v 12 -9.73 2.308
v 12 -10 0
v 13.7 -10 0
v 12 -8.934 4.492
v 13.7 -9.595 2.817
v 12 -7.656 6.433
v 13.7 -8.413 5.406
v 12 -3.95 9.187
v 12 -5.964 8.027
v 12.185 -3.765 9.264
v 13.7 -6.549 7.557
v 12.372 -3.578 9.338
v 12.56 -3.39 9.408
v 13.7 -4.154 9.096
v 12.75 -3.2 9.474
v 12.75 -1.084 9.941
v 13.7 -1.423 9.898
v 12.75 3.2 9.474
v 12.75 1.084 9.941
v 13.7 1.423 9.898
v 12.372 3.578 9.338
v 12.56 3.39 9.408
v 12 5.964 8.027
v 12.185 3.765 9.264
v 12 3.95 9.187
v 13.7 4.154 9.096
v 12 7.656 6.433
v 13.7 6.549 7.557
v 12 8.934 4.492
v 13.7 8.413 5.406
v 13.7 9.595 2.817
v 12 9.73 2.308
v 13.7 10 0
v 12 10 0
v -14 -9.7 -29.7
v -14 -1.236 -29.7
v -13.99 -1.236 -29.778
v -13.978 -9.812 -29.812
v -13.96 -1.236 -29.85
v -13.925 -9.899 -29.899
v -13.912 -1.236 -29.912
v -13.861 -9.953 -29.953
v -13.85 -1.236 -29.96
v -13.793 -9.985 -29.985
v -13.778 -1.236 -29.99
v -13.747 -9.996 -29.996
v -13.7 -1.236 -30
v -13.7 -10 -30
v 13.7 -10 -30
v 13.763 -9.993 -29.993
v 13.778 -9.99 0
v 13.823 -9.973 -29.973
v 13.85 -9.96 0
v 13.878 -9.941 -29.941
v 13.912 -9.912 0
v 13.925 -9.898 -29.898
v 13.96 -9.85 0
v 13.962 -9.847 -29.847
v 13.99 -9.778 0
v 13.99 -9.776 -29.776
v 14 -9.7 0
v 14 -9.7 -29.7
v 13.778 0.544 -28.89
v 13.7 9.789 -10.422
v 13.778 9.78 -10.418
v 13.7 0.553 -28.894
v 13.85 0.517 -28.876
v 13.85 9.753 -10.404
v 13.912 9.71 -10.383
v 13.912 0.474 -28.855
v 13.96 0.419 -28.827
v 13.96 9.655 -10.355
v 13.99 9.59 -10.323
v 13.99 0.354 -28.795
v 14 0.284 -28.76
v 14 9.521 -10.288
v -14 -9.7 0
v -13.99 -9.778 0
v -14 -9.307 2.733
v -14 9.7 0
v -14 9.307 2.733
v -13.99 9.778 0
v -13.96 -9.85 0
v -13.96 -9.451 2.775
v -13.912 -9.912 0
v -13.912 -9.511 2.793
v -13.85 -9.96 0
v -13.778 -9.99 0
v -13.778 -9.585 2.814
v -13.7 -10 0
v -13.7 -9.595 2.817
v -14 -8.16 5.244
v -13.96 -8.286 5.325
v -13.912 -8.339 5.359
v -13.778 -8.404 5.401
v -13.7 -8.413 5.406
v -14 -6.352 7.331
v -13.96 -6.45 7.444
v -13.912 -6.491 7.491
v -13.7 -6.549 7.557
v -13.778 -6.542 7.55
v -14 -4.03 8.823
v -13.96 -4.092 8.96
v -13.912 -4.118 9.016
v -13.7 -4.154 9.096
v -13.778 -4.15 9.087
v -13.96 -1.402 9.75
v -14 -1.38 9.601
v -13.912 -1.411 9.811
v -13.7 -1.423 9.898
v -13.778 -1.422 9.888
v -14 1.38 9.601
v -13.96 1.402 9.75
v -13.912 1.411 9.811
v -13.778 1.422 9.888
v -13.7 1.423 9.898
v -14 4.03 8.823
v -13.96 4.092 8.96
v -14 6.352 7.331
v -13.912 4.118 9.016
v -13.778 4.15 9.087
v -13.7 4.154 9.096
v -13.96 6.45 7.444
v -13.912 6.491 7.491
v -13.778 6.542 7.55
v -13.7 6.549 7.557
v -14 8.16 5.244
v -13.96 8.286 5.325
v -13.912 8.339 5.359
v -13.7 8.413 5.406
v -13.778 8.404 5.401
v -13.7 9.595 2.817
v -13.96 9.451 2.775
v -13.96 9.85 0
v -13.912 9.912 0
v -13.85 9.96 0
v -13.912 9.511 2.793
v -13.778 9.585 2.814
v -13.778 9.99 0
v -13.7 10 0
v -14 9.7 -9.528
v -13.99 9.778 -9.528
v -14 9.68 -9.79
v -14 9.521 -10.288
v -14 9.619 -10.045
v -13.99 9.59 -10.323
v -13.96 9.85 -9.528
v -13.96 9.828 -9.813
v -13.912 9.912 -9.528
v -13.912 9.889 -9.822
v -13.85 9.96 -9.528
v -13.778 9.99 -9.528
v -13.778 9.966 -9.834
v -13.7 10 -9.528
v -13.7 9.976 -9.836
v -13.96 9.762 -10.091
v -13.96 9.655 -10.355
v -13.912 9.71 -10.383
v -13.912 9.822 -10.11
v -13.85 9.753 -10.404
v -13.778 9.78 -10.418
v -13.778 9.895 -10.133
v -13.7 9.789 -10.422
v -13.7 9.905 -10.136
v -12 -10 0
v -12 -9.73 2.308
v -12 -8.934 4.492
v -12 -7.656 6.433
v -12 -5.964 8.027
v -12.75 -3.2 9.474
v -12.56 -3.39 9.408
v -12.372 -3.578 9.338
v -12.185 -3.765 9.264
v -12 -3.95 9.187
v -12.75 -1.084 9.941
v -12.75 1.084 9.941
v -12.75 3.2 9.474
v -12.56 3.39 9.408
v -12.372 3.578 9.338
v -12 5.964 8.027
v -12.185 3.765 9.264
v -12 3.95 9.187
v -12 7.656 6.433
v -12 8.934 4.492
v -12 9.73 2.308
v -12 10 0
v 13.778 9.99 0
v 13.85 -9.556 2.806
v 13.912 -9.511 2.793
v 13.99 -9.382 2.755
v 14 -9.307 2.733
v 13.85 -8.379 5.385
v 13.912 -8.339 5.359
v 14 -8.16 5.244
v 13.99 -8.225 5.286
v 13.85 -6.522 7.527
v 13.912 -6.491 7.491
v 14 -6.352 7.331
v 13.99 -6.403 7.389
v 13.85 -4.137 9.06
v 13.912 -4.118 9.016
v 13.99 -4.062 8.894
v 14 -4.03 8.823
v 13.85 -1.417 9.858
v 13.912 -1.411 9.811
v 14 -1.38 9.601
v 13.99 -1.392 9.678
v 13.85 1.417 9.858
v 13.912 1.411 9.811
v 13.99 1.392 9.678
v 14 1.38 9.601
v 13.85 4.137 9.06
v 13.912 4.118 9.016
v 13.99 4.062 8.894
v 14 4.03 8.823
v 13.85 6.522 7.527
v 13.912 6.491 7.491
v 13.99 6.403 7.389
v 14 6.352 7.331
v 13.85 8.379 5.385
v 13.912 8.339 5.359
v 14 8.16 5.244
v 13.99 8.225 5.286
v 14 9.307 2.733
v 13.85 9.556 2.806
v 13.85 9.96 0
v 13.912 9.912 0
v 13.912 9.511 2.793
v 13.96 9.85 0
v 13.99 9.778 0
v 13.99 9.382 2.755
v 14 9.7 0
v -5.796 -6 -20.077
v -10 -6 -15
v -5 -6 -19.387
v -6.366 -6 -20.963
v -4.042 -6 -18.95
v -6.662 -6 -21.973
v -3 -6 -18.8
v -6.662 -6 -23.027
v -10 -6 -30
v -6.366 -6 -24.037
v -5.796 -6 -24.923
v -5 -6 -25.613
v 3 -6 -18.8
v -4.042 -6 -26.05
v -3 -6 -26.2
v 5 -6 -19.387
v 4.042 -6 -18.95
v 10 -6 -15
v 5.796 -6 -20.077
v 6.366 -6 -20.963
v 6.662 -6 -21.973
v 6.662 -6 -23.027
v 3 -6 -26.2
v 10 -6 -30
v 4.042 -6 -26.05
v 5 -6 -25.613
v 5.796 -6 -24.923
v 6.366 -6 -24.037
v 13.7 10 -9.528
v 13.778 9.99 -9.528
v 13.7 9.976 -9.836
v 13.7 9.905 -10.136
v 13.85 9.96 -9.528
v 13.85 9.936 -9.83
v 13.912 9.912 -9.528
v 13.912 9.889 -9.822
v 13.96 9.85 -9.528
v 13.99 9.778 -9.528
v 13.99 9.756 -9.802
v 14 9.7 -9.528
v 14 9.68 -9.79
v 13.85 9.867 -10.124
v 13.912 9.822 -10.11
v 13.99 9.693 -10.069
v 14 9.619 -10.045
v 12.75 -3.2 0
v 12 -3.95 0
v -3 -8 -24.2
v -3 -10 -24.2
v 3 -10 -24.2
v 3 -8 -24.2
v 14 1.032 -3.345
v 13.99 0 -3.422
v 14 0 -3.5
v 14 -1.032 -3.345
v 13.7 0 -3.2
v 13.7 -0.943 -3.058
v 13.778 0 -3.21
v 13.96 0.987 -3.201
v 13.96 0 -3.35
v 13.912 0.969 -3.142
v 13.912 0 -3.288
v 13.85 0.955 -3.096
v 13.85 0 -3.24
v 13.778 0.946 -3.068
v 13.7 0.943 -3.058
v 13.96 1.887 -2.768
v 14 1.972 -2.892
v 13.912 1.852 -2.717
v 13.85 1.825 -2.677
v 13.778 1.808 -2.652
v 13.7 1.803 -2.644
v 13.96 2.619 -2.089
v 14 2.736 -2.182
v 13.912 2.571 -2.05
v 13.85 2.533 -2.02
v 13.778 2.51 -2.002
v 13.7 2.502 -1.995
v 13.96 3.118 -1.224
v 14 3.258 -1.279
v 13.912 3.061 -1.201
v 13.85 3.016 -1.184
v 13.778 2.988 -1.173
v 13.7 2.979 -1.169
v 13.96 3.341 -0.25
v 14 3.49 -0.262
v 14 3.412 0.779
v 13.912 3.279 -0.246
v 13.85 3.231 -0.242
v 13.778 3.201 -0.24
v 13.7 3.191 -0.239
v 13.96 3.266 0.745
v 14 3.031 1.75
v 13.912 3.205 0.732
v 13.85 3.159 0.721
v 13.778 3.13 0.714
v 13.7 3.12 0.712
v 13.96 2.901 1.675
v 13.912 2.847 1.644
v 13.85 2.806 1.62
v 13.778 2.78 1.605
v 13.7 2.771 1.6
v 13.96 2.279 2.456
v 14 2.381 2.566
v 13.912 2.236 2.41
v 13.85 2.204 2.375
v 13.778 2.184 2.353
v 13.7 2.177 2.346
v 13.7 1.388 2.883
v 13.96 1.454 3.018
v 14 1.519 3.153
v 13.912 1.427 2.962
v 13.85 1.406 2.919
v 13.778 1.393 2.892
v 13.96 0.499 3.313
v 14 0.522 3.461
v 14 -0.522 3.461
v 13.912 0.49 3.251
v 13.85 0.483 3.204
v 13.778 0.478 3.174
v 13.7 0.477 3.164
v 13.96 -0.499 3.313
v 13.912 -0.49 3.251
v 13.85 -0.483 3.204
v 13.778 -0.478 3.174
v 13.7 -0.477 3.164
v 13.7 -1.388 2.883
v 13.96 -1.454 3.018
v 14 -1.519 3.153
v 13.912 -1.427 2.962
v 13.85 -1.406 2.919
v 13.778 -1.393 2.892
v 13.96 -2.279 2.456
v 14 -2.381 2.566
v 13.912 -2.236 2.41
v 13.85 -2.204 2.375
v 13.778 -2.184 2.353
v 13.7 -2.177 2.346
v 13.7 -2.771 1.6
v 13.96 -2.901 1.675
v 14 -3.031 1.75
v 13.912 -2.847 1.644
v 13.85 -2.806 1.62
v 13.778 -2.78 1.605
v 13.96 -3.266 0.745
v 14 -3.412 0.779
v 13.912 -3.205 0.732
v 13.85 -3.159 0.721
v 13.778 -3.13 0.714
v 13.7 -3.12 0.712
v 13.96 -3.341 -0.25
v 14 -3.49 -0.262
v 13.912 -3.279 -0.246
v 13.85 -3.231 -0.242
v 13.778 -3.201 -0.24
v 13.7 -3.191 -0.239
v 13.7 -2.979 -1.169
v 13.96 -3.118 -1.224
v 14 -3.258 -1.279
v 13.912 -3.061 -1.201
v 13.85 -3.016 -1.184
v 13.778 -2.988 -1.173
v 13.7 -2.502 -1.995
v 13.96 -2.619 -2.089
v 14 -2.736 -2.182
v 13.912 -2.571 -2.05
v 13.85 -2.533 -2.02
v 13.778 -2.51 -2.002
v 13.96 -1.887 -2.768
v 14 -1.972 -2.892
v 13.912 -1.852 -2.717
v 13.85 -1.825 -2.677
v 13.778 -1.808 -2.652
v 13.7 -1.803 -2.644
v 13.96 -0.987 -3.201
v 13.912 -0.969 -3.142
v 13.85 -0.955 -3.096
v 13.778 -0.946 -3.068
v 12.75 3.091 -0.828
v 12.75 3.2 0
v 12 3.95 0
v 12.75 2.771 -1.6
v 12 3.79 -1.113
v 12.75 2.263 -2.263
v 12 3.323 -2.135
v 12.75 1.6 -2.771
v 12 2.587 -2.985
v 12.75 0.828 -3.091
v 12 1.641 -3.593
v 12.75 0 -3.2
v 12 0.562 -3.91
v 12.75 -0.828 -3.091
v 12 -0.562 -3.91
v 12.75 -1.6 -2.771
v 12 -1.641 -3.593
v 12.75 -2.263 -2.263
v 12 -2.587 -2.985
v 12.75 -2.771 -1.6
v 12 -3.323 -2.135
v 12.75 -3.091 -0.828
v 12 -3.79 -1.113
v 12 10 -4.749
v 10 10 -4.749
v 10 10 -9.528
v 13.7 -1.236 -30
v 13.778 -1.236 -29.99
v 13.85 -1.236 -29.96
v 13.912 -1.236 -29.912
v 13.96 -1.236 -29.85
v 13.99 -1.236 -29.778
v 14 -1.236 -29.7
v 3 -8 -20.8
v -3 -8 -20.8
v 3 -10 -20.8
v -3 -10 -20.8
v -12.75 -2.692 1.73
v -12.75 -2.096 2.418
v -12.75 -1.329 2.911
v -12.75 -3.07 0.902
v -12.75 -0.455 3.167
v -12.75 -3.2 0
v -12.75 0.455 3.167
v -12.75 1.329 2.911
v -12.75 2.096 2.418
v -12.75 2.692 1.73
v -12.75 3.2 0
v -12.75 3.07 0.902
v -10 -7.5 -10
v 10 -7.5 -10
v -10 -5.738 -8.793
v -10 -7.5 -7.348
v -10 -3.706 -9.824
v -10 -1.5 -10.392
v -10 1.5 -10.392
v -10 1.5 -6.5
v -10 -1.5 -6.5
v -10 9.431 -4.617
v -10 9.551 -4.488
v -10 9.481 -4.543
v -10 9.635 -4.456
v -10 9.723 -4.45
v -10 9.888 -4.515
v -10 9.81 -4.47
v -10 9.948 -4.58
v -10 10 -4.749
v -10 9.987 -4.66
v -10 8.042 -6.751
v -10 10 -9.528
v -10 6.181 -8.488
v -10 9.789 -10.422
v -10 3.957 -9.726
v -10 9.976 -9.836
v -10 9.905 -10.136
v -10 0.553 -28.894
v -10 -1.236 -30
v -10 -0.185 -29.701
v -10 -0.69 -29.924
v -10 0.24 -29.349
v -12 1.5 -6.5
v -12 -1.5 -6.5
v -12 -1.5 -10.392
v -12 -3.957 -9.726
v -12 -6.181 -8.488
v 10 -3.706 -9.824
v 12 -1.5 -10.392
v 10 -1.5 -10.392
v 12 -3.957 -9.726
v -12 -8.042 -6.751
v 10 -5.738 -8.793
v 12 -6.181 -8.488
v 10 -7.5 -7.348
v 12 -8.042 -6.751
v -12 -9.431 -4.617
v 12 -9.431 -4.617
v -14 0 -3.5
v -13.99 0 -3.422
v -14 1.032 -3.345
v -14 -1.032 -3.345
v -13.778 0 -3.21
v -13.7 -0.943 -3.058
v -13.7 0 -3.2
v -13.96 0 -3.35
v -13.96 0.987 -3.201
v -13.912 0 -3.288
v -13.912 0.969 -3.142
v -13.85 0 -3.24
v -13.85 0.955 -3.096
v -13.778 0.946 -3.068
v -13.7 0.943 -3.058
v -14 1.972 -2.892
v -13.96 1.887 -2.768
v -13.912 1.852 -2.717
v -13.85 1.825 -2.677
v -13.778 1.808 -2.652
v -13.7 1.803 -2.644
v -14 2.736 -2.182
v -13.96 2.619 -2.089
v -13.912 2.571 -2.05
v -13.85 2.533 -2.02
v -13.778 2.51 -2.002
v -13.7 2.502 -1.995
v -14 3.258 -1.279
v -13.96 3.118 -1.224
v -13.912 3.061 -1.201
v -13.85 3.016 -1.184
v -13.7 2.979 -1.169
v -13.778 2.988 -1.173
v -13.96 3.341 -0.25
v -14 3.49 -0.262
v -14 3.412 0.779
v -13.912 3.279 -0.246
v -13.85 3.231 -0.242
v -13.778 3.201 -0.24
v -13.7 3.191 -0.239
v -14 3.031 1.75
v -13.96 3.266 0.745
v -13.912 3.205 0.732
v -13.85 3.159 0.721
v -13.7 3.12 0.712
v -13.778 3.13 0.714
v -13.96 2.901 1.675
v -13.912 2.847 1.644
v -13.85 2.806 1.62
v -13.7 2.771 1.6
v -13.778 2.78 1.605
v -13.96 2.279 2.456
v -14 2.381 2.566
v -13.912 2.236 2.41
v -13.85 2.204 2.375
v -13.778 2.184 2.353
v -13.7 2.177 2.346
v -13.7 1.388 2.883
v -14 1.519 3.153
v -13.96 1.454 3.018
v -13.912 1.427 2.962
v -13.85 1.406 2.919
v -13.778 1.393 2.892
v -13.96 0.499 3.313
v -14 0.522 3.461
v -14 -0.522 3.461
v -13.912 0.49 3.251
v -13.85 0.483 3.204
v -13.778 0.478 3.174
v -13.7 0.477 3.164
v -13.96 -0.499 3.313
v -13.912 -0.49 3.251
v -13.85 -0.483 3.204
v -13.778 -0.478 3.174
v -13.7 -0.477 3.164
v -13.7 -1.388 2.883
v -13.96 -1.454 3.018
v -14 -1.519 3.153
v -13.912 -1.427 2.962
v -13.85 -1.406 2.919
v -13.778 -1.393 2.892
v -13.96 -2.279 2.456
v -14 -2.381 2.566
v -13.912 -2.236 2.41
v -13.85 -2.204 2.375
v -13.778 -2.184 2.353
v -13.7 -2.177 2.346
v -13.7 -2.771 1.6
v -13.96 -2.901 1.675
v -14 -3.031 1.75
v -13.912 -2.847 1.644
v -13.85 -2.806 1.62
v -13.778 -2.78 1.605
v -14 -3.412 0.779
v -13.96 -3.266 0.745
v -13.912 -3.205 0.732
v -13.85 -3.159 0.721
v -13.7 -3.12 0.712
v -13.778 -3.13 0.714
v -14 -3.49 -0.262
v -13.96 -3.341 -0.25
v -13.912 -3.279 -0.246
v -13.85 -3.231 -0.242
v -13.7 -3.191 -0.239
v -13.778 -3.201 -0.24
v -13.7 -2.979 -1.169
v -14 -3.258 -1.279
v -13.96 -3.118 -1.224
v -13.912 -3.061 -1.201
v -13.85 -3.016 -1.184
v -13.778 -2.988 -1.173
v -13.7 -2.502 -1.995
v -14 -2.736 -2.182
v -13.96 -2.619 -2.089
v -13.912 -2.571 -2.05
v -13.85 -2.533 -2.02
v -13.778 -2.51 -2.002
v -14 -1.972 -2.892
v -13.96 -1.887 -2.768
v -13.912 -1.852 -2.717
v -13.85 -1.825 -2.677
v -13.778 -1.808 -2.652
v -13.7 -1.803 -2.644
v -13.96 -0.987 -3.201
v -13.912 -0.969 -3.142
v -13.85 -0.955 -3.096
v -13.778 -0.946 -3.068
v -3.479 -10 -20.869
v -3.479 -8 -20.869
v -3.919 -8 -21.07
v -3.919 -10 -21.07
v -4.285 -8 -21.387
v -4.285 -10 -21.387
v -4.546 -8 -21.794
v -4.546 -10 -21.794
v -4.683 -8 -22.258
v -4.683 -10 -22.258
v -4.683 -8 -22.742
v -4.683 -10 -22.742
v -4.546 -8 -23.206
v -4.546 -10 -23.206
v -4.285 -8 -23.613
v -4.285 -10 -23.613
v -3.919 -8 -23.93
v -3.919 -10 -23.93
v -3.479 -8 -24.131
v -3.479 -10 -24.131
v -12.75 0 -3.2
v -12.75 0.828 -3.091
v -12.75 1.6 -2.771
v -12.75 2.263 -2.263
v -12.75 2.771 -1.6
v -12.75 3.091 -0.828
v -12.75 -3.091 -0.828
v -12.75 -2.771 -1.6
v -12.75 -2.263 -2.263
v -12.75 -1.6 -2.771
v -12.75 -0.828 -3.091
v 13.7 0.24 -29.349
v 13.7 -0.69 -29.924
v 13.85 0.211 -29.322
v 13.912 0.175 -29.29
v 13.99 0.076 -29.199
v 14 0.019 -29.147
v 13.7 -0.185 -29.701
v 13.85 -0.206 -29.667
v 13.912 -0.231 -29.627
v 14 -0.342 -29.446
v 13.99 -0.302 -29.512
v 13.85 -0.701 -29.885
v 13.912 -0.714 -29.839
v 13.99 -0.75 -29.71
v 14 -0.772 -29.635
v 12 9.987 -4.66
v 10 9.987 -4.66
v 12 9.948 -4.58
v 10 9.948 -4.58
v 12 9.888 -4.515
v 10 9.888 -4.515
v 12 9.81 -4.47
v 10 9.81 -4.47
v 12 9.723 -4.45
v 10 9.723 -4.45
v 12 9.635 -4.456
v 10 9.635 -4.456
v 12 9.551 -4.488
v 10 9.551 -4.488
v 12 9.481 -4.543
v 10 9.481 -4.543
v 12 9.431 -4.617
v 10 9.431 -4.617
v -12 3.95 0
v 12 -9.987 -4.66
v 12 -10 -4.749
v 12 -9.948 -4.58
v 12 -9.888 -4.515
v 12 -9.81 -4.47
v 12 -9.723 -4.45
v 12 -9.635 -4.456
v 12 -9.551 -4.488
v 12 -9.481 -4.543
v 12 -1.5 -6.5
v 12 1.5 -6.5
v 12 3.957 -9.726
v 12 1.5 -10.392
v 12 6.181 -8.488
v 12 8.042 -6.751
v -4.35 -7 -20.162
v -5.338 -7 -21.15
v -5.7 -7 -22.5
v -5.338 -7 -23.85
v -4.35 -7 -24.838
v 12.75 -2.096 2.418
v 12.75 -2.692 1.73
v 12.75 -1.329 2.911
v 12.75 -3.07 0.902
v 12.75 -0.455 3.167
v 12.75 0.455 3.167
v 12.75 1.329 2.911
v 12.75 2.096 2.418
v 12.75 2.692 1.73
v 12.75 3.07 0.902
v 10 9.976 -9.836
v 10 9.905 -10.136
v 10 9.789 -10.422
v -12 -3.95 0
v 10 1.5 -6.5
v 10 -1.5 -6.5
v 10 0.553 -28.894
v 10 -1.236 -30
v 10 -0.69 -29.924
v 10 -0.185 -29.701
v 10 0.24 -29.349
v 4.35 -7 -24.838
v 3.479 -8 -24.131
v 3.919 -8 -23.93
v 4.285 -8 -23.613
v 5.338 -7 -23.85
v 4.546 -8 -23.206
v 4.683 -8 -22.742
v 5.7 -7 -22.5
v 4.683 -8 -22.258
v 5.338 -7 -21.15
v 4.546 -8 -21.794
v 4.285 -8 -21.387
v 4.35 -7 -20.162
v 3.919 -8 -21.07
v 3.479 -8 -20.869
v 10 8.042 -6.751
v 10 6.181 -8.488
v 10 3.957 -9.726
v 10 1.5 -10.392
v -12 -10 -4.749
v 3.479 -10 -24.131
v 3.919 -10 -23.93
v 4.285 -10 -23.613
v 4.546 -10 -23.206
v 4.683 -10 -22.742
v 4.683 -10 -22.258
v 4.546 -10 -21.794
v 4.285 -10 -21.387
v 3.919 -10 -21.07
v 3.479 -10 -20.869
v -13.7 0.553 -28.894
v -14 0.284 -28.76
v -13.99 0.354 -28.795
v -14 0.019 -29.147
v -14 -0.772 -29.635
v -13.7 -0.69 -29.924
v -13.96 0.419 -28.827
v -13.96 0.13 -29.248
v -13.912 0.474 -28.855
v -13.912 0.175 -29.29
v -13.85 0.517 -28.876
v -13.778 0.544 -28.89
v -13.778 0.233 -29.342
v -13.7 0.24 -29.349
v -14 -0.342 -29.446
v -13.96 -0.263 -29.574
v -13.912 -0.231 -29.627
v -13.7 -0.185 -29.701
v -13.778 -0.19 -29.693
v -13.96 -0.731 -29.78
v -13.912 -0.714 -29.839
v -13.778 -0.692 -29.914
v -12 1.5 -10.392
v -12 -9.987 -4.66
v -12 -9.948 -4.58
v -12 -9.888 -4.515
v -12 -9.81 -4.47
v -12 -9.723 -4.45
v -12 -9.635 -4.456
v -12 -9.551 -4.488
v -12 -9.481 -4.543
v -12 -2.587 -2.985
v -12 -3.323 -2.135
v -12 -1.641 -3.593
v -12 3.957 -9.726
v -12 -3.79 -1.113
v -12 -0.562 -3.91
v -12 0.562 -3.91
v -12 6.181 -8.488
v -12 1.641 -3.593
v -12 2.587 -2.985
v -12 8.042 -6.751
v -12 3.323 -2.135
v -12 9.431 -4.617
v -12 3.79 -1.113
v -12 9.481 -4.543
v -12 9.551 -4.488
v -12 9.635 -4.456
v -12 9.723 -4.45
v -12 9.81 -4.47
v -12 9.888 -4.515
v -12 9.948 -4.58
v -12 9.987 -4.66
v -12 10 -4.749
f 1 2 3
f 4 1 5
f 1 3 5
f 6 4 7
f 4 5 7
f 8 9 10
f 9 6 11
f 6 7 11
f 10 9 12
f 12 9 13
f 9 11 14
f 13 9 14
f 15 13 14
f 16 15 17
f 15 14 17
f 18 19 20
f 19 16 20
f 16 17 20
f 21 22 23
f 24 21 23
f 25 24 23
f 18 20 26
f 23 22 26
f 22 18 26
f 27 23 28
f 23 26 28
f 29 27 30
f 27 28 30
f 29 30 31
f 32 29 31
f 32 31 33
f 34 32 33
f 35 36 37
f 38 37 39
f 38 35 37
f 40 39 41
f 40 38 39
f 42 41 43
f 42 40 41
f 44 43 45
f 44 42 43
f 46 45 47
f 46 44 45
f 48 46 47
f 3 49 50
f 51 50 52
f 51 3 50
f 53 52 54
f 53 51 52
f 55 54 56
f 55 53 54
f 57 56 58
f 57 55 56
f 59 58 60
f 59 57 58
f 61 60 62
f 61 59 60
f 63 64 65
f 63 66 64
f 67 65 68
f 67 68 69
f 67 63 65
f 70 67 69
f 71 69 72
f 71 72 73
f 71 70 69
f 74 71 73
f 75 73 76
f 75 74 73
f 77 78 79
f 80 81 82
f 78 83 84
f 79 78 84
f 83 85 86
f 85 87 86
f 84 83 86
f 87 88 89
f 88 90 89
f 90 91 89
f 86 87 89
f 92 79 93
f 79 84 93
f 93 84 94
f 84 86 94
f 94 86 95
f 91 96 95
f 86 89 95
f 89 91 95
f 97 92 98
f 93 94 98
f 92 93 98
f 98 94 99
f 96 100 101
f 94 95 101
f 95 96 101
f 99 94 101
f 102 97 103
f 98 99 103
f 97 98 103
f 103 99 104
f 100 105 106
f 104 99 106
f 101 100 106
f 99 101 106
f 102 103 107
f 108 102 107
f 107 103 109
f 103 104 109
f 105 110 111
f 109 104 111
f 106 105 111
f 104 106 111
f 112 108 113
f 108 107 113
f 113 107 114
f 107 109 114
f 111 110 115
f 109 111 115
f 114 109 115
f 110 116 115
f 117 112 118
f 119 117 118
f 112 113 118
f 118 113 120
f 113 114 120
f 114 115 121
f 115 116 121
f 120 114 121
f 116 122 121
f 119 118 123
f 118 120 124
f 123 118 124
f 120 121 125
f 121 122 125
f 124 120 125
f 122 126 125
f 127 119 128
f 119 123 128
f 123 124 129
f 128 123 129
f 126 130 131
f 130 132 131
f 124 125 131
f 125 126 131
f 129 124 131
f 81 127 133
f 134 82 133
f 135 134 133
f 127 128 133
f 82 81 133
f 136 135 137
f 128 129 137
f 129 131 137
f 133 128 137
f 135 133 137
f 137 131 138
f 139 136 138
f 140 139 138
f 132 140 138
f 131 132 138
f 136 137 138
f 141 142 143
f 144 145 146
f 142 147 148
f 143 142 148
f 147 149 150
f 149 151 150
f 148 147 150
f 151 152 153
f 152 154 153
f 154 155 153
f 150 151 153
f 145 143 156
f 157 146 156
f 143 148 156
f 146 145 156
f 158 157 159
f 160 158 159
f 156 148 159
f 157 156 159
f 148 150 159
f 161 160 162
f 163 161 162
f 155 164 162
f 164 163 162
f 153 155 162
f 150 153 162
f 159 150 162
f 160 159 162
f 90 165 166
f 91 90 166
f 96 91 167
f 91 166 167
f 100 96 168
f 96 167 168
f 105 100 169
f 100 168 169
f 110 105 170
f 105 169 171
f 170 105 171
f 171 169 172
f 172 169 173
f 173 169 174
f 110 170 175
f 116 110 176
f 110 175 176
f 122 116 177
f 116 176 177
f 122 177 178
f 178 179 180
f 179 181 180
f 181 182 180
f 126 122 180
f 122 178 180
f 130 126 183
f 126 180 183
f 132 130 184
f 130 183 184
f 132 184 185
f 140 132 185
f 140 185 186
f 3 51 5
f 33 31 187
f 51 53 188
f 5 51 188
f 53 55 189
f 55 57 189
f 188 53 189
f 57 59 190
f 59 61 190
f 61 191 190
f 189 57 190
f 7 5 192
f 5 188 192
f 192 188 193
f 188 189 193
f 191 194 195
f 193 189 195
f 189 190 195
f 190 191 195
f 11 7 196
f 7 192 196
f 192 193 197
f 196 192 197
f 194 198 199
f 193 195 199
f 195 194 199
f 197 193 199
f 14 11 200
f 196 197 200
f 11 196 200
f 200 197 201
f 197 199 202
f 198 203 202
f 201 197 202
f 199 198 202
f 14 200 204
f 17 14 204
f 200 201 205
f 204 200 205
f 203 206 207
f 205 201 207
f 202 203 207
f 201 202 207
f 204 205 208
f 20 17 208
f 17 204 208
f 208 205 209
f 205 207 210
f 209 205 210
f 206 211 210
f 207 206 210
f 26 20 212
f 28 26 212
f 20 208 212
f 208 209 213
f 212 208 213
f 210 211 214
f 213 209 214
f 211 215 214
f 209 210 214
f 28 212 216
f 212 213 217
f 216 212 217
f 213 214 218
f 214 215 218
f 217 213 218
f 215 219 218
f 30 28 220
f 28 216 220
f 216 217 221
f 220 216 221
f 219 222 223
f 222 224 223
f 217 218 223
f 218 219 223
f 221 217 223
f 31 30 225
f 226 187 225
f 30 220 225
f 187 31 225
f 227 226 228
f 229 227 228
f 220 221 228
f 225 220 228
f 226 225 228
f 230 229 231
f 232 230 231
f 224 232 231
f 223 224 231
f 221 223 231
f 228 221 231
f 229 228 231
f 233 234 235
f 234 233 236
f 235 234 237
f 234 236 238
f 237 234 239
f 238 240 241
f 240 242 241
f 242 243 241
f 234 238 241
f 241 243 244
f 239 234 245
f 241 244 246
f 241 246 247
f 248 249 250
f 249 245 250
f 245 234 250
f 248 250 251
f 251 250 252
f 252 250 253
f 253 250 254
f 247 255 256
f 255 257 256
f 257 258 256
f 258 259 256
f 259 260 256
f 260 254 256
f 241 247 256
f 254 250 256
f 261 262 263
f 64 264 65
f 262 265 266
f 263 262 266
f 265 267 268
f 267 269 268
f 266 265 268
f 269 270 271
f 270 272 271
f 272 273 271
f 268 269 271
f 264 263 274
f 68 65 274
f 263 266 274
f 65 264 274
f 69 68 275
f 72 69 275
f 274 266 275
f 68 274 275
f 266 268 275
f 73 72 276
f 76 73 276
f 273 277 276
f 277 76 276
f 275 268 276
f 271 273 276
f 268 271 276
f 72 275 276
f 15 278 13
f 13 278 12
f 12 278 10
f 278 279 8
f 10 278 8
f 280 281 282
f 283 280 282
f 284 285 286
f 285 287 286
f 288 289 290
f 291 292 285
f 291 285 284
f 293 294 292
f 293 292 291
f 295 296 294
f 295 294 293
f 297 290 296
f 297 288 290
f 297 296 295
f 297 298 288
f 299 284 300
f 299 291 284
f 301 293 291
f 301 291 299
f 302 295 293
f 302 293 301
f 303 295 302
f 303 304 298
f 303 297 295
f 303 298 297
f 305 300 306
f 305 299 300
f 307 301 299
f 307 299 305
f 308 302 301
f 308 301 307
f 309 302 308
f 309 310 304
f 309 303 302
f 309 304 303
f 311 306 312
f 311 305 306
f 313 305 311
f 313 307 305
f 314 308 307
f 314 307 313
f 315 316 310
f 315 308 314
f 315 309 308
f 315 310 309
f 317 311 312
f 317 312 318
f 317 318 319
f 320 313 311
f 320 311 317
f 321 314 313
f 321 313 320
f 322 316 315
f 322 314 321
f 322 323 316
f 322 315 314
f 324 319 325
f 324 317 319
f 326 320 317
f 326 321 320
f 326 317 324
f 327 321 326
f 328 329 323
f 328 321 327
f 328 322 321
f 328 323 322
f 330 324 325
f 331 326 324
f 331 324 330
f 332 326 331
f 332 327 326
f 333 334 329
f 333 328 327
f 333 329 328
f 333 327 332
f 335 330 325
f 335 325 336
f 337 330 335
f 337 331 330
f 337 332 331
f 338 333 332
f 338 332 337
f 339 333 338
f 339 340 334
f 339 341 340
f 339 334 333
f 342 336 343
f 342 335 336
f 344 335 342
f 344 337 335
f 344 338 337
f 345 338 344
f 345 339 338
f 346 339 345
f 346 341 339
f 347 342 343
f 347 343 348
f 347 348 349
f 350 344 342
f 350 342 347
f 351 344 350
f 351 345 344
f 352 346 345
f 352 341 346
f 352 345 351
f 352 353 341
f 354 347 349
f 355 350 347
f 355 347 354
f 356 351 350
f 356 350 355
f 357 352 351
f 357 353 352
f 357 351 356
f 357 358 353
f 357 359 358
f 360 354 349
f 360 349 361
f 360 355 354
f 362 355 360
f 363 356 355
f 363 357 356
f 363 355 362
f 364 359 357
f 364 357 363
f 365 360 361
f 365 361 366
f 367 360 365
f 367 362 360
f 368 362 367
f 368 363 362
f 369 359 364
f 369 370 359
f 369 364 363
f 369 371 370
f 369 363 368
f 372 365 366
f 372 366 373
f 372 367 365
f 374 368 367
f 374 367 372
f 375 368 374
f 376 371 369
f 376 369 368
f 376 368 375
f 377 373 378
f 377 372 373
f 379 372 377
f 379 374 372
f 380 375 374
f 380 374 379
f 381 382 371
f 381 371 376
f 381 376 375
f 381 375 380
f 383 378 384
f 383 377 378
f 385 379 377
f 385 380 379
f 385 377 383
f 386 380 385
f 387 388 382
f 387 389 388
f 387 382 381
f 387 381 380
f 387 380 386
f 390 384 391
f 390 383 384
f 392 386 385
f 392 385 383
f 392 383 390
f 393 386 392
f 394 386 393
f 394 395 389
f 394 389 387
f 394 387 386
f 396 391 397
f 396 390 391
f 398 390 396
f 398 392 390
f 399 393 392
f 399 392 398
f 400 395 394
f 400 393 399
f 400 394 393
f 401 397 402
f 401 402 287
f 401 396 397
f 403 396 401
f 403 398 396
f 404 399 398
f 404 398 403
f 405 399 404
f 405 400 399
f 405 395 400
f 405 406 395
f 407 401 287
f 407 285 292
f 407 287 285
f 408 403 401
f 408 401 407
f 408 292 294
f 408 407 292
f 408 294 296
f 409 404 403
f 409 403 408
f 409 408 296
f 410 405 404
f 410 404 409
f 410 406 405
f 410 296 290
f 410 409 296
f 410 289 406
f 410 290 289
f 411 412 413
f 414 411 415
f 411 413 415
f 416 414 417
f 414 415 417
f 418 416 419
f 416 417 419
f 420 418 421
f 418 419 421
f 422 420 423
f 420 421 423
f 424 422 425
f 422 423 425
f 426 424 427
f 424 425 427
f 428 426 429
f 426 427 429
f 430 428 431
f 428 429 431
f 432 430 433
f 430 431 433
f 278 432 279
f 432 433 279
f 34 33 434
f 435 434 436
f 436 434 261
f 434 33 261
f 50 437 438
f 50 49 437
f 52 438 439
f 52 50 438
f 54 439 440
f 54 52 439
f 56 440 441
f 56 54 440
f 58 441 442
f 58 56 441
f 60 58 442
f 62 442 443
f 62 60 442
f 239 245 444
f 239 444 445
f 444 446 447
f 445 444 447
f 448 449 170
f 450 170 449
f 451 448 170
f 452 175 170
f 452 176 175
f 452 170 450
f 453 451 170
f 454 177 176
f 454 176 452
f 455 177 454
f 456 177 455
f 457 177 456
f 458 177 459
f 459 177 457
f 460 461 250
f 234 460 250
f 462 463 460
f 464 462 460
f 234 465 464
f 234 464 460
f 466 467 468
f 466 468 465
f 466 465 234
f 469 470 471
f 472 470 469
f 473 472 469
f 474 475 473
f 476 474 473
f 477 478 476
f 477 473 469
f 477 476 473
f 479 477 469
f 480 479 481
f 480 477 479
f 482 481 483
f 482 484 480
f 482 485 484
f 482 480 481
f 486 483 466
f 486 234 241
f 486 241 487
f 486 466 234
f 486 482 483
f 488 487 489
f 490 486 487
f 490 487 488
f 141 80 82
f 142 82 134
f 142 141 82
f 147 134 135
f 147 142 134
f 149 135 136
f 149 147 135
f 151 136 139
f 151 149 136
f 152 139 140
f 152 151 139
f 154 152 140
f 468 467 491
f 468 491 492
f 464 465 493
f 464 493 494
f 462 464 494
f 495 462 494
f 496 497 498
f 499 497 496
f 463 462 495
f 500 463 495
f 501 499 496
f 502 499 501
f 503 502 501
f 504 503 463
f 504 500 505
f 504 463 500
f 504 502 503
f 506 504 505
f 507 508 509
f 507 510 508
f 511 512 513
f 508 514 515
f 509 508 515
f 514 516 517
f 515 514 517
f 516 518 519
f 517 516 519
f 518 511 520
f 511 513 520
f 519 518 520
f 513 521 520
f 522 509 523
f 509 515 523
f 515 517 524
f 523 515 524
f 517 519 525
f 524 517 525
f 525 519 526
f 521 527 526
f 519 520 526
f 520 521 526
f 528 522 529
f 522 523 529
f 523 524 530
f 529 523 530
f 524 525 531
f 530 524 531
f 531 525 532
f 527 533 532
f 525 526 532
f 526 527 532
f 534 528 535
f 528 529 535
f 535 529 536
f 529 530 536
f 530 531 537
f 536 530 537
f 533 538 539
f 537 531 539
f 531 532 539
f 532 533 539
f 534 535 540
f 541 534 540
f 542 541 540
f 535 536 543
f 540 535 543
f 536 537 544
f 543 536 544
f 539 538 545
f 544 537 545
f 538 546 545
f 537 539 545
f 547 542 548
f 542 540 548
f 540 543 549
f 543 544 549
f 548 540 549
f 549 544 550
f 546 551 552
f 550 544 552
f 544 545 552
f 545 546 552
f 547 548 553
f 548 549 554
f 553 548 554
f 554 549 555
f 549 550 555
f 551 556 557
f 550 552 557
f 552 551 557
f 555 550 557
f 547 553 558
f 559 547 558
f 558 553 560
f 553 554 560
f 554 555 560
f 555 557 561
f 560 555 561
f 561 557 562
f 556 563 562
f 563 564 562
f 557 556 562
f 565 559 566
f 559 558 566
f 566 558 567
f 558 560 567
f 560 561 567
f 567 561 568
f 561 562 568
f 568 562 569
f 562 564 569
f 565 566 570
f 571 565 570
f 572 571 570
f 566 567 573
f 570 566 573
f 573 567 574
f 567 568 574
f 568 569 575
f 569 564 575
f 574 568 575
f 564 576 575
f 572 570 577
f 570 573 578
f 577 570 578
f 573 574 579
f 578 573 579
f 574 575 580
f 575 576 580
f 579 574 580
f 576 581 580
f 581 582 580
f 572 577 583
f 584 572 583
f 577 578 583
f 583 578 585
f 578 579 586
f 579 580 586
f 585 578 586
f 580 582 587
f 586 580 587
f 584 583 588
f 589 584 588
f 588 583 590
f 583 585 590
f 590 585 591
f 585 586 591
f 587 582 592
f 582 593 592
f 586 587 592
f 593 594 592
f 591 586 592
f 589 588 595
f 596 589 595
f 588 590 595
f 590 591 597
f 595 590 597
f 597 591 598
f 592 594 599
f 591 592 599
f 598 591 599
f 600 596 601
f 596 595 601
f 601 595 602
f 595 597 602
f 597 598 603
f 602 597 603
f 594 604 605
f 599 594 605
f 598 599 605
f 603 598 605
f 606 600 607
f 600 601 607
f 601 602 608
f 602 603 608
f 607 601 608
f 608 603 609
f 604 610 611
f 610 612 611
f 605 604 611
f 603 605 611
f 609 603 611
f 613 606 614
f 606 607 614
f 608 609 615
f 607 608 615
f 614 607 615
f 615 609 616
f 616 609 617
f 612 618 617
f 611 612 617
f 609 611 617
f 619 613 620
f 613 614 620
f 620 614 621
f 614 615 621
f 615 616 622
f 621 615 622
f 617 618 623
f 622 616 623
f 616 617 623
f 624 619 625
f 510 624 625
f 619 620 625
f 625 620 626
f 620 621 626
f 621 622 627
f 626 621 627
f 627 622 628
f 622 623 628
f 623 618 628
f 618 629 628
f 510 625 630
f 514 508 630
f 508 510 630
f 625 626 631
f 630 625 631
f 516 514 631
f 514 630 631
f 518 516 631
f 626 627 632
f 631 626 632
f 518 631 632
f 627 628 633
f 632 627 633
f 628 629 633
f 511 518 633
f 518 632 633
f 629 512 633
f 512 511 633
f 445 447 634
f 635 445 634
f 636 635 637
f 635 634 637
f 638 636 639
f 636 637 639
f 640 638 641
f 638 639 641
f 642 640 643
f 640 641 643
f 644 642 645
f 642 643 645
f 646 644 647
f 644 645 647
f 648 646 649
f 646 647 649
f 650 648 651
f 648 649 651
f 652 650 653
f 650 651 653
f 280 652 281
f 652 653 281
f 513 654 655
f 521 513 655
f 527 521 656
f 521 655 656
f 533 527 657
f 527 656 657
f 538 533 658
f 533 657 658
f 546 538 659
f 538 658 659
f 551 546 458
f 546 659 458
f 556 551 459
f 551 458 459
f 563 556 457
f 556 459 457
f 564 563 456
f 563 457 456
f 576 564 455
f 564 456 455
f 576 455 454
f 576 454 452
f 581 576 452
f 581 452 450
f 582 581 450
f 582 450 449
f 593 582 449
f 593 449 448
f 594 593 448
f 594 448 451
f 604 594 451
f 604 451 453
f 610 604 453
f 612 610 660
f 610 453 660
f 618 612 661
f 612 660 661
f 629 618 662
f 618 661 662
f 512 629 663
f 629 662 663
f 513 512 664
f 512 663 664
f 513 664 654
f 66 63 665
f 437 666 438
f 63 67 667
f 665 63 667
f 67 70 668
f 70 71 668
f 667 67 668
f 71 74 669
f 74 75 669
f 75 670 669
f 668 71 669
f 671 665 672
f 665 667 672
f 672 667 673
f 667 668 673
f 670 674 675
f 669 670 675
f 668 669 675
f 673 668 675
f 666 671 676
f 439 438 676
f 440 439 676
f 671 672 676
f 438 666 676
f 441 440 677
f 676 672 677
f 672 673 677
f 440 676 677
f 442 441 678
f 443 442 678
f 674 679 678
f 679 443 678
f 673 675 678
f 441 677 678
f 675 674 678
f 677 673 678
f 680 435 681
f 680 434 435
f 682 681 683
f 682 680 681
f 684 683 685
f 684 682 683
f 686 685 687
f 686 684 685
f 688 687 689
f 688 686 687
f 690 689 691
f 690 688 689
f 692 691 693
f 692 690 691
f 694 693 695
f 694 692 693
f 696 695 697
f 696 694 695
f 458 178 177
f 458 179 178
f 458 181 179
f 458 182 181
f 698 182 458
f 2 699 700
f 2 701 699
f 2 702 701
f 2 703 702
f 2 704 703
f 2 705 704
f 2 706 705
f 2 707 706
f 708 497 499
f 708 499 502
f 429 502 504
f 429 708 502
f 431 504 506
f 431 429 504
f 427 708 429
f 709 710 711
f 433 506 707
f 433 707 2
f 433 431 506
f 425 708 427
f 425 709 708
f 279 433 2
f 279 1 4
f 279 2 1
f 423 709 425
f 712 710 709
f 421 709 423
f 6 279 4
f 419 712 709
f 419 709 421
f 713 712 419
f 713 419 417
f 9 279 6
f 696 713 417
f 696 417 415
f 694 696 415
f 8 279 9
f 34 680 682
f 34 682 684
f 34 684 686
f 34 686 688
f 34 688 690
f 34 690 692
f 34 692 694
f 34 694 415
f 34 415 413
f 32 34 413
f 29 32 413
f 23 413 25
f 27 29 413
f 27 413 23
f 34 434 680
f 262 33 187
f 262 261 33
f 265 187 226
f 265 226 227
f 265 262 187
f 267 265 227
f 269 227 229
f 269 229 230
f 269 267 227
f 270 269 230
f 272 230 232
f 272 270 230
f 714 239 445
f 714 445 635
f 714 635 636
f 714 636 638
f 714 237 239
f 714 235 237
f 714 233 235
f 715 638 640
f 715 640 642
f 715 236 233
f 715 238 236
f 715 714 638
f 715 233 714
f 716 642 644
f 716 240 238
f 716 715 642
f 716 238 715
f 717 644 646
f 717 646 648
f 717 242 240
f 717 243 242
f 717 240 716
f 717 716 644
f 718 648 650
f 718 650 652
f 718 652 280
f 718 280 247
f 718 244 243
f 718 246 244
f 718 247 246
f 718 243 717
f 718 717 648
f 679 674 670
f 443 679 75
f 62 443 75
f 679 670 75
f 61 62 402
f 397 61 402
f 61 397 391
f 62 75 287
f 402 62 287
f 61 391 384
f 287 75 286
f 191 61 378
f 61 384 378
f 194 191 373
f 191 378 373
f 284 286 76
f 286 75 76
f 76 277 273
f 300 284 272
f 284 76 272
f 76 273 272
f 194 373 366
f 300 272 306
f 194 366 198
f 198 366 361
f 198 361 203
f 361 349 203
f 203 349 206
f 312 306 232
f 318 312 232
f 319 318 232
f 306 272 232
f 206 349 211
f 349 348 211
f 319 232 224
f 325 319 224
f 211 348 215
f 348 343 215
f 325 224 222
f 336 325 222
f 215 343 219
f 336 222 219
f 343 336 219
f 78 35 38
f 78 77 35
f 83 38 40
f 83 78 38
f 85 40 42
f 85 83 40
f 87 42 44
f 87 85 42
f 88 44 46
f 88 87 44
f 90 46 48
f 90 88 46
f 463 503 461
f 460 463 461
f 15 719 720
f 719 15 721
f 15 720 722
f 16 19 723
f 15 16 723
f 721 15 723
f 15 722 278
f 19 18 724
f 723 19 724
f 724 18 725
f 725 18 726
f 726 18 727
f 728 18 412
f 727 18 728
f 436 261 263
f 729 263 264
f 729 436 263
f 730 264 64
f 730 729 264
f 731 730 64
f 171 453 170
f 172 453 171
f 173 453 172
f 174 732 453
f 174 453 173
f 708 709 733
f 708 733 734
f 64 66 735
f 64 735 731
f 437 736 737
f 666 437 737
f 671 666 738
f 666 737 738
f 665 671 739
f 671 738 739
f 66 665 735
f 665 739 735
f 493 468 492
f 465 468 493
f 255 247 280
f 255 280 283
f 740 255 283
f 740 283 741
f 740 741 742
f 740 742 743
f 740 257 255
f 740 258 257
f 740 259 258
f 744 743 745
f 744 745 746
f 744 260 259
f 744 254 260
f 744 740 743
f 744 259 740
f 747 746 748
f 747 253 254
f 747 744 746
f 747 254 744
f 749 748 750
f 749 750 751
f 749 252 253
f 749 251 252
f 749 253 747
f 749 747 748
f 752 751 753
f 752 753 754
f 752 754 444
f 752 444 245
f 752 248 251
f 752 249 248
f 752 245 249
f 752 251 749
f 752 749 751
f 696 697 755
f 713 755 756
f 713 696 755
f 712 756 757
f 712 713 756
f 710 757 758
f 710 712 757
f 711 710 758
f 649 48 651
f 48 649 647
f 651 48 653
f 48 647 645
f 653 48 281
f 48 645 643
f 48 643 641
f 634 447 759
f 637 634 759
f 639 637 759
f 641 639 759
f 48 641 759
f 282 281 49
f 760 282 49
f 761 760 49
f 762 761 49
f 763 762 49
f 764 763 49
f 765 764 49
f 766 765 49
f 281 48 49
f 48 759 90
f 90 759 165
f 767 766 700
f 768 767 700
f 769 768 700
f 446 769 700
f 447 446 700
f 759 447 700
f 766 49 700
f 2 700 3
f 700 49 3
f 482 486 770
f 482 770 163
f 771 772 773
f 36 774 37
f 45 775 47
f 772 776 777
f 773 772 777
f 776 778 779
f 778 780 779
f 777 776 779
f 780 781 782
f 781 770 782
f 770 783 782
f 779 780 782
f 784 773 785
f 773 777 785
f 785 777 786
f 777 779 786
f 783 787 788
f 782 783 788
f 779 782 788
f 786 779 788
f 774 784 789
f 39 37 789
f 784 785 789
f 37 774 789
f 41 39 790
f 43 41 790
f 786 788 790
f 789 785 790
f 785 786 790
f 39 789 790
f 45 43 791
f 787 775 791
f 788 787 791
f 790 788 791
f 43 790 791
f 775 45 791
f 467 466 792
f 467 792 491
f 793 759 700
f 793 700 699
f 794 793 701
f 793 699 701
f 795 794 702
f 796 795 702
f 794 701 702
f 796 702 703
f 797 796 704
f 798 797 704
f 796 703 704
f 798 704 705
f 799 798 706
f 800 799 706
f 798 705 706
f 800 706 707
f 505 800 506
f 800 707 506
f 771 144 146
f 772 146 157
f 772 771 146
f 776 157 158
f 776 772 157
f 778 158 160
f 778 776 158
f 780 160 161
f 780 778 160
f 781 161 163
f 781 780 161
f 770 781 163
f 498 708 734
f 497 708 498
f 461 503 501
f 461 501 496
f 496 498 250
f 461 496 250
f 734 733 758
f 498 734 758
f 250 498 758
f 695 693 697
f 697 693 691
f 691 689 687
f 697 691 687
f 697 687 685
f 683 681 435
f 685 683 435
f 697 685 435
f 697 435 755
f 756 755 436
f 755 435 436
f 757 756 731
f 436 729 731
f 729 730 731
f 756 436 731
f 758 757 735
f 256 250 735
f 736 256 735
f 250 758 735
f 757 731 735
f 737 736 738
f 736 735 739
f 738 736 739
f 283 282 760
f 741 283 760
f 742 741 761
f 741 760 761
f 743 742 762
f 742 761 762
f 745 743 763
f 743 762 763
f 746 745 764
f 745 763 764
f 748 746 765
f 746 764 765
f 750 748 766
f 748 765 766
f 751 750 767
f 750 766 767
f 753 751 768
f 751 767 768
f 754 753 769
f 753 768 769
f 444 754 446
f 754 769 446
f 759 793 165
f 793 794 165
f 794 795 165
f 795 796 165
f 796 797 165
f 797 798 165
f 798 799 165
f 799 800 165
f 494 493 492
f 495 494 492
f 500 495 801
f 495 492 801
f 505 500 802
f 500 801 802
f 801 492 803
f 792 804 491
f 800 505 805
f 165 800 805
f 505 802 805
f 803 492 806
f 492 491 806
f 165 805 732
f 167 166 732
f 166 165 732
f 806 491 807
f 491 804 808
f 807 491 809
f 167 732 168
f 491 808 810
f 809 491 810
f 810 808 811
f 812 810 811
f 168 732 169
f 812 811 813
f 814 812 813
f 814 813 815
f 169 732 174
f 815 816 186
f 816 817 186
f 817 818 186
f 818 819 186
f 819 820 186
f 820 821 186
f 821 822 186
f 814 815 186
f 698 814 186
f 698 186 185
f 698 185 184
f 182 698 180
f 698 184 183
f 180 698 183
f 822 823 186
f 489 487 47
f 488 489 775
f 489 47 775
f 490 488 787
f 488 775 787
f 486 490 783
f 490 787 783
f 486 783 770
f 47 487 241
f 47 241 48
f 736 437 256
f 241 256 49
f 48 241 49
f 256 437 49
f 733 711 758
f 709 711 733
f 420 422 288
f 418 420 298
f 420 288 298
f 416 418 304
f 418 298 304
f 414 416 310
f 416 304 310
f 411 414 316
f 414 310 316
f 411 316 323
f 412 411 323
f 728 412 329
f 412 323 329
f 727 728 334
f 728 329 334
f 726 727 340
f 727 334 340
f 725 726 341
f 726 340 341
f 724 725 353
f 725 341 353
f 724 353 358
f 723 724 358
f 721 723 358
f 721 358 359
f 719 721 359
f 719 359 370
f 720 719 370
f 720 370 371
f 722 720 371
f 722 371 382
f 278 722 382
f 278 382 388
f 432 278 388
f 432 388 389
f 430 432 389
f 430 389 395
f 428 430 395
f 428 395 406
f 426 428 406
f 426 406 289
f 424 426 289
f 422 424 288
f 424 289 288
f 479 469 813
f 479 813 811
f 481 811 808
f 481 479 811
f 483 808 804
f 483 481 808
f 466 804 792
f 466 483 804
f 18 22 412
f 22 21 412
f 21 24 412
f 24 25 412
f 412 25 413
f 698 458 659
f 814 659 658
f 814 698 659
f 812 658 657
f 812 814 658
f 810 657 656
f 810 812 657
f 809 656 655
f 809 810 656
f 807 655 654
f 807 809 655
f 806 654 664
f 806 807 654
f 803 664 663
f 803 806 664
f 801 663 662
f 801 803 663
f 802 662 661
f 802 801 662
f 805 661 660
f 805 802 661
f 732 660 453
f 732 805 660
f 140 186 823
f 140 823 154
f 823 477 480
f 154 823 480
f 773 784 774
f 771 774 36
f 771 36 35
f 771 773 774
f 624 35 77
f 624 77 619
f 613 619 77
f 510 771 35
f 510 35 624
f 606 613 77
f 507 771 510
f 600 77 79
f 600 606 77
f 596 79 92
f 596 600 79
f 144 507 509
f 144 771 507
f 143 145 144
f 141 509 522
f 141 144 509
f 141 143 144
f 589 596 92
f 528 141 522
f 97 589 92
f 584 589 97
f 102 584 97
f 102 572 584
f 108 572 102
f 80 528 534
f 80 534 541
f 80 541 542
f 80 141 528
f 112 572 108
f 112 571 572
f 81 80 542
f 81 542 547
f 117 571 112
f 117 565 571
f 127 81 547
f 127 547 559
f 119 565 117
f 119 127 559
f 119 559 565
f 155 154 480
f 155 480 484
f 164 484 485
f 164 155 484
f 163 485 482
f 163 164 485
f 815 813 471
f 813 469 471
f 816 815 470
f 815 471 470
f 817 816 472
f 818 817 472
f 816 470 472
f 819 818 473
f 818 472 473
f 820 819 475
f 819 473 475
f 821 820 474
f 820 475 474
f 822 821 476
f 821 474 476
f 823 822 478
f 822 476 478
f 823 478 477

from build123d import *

# Parameters (mm, degrees)
BOSS_EXTRUDE1_DEPTH = 14
SKETCH2_R           = 3.2
CUT_EXTRUDE1_DEPTH  = 48
CUT_EXTRUDE2_DEPTH  = 10
CUT_EXTRUDE4_DEPTH  = 12
FILLET1_R           = 0.3
CUT_EXTRUDE3_DEPTH  = 4
CHAMFER1_SIZE       = 2
FILLET2_R           = 2
FILLET3_R           = 0.3
SKETCH7_W           = 25.5
SKETCH7_H           = 10
CUT_EXTRUDE5_DEPTH  = 3.2
CHAMFER2_SIZE       = 0.75


with BuildPart() as part:
    # Sketch1 → Boss-Extrude1 (new, symmetric)
    with BuildSketch(Plane(origin=(0, 0, 0), x_dir=(0, 0, -1), z_dir=(1, 0, 0))):
        with BuildLine():
            Line((30, -10), (0, -10))
            ThreePointArc((0, -10), (-10, 0), (0, 10))
            Line((0, 10), (30, 10))
            Line((30, 10), (30, -10))
        make_face()
    extrude(amount=BOSS_EXTRUDE1_DEPTH, both=True)

    # Sketch2 → Cut-Extrude1 (cut)
    with BuildSketch(Plane(origin=(14, 0, 0), x_dir=(0, 0, -1), z_dir=(1, 0, 0))):
        Circle(SKETCH2_R)
        Polygon((30, 0), (10, 10), (30, 10), align=None)
    extrude(amount=-CUT_EXTRUDE1_DEPTH, mode=Mode.SUBTRACT)

    # Sketch4 → Cut-Extrude2 (cut, symmetric)
    with BuildSketch(Plane(origin=(0, 0, 0), x_dir=(0, 0, -1), z_dir=(1, 0, 0))):
        with BuildLine():
            Line((0, -10), (1.5, -10))
            Line((1.5, -10), (1.5, -7.5))
            Line((1.5, -7.5), (10, -7.5))
            Line((10, -7.5), (15, -6))
            Line((15, -6), (30, -6))
            Line((30, -6), (30, 0))
            Line((30, 0), (10, 10))
            Line((10, 10), (0, 10))
            ThreePointArc((0, 10), (-10, 0), (0, -10))
        make_face()
    extrude(amount=CUT_EXTRUDE2_DEPTH, both=True, mode=Mode.SUBTRACT)

    # Sketch6 → Cut-Extrude4 (cut, symmetric)
    with BuildSketch(Plane(origin=(0, 0, 0), x_dir=(0, 0, -1), z_dir=(1, 0, 0))):
        with BuildLine():
            Line((10.392304845, 1.5), (6.5, 1.5))
            Line((6.5, 1.5), (6.5, -1.5))
            Line((6.5, -1.5), (10.392304845, -1.5))
            ThreePointArc((10.392304845, -1.5), (-10.5, 0), (10.392304845, 1.5))
        make_face()
    extrude(amount=CUT_EXTRUDE4_DEPTH, both=True, mode=Mode.SUBTRACT)

    # Fillet1
    fillet1_edges = [part.edges().sort_by_distance(p)[0] for p in [
        (0, -10, -3.201562119),
        (-11, 10, -3.201562119),
        (11, 10, -3.201562119),
    ]]
    fillet(fillet1_edges, radius=FILLET1_R)

    # Sketch5 → Cut-Extrude3 (cut)
    with BuildSketch(Plane(origin=(0, -10, 0), x_dir=(1, 0, 0), z_dir=(0, 1, 0))):
        with BuildLine():
            Line((-3, 24.2), (3, 24.2))
            ThreePointArc((3, 24.2), (4.7, 22.5), (3, 20.8))
            Line((3, 20.8), (-3, 20.8))
            ThreePointArc((-3, 20.8), (-4.7, 22.5), (-3, 24.2))
        make_face()
    extrude(amount=CUT_EXTRUDE3_DEPTH, mode=Mode.SUBTRACT)

    # Chamfer1
    chamfer1_edges = [part.edges().sort_by_distance(p)[0] for p in [
        (0, -6, -24.2),
        (4.7, -6, -22.5),
        (0, -6, -20.8),
        (-4.7, -6, -22.5),
    ]]
    chamfer(chamfer1_edges, length=CHAMFER1_SIZE)

    # Fillet2
    fillet2_edges = [part.edges().sort_by_distance(p)[0] for p in [
        (-12, 0, -30),
        (-12, 10, -10),
        (12, 10, -10),
        (12, 0, -30),
    ]]
    fillet(fillet2_edges, radius=FILLET2_R)

    # Fillet3
    fillet3_edges = [part.edges().sort_by_distance(p)[0] for p in [
        (14, -5.618033989, -30),
        (-14, 5.170820393, -19.658359214),
        (-14, 10, -4.763932023),
        (-14, -0.184605753, -29.701301617),
        (-14, 9.946497979, -9.987369886),
        (14, 5.170820393, -19.658359214),
        (14, 10, -4.763932023),
        (14, -0.184605753, -29.701301617),
        (14, 9.946497979, -9.987369886),
        (-14, 0, 3.2),
        (14, 0, 3.2),
        (14, 0, 10),
        (-14, -5.618033989, -30),
        (-14, -10, -15),
        (-14, 0, 10),
        (14, -10, -15),
    ]]
    fillet(fillet3_edges, radius=FILLET3_R)

    # Sketch7 → Cut-Extrude5 (cut, symmetric)
    with BuildSketch(Plane(origin=(0, 0, 0), x_dir=(1, 0, 0), z_dir=(0, 1, 0))):
        with Locations((0, -5)):
            Rectangle(SKETCH7_W, SKETCH7_H)
    extrude(amount=CUT_EXTRUDE5_DEPTH, both=True, mode=Mode.SUBTRACT)

    # Chamfer2
    chamfer2_edges = [part.edges().sort_by_distance(p)[0] for p in [
        (12, 3.2, 4.737087713),
        (12, -3.2, 4.737087713),
        (12, -2.2627417, -2.2627417),
        (-12, 3.2, 4.737087713),
        (-12, -3.2, 4.737087713),
        (-12, 2.2627417, -2.2627417),
    ]]
    chamfer(chamfer2_edges, length=CHAMFER2_SIZE - 0.0001)  # a hair under: the kernel refuses the full size


solid = part.part
